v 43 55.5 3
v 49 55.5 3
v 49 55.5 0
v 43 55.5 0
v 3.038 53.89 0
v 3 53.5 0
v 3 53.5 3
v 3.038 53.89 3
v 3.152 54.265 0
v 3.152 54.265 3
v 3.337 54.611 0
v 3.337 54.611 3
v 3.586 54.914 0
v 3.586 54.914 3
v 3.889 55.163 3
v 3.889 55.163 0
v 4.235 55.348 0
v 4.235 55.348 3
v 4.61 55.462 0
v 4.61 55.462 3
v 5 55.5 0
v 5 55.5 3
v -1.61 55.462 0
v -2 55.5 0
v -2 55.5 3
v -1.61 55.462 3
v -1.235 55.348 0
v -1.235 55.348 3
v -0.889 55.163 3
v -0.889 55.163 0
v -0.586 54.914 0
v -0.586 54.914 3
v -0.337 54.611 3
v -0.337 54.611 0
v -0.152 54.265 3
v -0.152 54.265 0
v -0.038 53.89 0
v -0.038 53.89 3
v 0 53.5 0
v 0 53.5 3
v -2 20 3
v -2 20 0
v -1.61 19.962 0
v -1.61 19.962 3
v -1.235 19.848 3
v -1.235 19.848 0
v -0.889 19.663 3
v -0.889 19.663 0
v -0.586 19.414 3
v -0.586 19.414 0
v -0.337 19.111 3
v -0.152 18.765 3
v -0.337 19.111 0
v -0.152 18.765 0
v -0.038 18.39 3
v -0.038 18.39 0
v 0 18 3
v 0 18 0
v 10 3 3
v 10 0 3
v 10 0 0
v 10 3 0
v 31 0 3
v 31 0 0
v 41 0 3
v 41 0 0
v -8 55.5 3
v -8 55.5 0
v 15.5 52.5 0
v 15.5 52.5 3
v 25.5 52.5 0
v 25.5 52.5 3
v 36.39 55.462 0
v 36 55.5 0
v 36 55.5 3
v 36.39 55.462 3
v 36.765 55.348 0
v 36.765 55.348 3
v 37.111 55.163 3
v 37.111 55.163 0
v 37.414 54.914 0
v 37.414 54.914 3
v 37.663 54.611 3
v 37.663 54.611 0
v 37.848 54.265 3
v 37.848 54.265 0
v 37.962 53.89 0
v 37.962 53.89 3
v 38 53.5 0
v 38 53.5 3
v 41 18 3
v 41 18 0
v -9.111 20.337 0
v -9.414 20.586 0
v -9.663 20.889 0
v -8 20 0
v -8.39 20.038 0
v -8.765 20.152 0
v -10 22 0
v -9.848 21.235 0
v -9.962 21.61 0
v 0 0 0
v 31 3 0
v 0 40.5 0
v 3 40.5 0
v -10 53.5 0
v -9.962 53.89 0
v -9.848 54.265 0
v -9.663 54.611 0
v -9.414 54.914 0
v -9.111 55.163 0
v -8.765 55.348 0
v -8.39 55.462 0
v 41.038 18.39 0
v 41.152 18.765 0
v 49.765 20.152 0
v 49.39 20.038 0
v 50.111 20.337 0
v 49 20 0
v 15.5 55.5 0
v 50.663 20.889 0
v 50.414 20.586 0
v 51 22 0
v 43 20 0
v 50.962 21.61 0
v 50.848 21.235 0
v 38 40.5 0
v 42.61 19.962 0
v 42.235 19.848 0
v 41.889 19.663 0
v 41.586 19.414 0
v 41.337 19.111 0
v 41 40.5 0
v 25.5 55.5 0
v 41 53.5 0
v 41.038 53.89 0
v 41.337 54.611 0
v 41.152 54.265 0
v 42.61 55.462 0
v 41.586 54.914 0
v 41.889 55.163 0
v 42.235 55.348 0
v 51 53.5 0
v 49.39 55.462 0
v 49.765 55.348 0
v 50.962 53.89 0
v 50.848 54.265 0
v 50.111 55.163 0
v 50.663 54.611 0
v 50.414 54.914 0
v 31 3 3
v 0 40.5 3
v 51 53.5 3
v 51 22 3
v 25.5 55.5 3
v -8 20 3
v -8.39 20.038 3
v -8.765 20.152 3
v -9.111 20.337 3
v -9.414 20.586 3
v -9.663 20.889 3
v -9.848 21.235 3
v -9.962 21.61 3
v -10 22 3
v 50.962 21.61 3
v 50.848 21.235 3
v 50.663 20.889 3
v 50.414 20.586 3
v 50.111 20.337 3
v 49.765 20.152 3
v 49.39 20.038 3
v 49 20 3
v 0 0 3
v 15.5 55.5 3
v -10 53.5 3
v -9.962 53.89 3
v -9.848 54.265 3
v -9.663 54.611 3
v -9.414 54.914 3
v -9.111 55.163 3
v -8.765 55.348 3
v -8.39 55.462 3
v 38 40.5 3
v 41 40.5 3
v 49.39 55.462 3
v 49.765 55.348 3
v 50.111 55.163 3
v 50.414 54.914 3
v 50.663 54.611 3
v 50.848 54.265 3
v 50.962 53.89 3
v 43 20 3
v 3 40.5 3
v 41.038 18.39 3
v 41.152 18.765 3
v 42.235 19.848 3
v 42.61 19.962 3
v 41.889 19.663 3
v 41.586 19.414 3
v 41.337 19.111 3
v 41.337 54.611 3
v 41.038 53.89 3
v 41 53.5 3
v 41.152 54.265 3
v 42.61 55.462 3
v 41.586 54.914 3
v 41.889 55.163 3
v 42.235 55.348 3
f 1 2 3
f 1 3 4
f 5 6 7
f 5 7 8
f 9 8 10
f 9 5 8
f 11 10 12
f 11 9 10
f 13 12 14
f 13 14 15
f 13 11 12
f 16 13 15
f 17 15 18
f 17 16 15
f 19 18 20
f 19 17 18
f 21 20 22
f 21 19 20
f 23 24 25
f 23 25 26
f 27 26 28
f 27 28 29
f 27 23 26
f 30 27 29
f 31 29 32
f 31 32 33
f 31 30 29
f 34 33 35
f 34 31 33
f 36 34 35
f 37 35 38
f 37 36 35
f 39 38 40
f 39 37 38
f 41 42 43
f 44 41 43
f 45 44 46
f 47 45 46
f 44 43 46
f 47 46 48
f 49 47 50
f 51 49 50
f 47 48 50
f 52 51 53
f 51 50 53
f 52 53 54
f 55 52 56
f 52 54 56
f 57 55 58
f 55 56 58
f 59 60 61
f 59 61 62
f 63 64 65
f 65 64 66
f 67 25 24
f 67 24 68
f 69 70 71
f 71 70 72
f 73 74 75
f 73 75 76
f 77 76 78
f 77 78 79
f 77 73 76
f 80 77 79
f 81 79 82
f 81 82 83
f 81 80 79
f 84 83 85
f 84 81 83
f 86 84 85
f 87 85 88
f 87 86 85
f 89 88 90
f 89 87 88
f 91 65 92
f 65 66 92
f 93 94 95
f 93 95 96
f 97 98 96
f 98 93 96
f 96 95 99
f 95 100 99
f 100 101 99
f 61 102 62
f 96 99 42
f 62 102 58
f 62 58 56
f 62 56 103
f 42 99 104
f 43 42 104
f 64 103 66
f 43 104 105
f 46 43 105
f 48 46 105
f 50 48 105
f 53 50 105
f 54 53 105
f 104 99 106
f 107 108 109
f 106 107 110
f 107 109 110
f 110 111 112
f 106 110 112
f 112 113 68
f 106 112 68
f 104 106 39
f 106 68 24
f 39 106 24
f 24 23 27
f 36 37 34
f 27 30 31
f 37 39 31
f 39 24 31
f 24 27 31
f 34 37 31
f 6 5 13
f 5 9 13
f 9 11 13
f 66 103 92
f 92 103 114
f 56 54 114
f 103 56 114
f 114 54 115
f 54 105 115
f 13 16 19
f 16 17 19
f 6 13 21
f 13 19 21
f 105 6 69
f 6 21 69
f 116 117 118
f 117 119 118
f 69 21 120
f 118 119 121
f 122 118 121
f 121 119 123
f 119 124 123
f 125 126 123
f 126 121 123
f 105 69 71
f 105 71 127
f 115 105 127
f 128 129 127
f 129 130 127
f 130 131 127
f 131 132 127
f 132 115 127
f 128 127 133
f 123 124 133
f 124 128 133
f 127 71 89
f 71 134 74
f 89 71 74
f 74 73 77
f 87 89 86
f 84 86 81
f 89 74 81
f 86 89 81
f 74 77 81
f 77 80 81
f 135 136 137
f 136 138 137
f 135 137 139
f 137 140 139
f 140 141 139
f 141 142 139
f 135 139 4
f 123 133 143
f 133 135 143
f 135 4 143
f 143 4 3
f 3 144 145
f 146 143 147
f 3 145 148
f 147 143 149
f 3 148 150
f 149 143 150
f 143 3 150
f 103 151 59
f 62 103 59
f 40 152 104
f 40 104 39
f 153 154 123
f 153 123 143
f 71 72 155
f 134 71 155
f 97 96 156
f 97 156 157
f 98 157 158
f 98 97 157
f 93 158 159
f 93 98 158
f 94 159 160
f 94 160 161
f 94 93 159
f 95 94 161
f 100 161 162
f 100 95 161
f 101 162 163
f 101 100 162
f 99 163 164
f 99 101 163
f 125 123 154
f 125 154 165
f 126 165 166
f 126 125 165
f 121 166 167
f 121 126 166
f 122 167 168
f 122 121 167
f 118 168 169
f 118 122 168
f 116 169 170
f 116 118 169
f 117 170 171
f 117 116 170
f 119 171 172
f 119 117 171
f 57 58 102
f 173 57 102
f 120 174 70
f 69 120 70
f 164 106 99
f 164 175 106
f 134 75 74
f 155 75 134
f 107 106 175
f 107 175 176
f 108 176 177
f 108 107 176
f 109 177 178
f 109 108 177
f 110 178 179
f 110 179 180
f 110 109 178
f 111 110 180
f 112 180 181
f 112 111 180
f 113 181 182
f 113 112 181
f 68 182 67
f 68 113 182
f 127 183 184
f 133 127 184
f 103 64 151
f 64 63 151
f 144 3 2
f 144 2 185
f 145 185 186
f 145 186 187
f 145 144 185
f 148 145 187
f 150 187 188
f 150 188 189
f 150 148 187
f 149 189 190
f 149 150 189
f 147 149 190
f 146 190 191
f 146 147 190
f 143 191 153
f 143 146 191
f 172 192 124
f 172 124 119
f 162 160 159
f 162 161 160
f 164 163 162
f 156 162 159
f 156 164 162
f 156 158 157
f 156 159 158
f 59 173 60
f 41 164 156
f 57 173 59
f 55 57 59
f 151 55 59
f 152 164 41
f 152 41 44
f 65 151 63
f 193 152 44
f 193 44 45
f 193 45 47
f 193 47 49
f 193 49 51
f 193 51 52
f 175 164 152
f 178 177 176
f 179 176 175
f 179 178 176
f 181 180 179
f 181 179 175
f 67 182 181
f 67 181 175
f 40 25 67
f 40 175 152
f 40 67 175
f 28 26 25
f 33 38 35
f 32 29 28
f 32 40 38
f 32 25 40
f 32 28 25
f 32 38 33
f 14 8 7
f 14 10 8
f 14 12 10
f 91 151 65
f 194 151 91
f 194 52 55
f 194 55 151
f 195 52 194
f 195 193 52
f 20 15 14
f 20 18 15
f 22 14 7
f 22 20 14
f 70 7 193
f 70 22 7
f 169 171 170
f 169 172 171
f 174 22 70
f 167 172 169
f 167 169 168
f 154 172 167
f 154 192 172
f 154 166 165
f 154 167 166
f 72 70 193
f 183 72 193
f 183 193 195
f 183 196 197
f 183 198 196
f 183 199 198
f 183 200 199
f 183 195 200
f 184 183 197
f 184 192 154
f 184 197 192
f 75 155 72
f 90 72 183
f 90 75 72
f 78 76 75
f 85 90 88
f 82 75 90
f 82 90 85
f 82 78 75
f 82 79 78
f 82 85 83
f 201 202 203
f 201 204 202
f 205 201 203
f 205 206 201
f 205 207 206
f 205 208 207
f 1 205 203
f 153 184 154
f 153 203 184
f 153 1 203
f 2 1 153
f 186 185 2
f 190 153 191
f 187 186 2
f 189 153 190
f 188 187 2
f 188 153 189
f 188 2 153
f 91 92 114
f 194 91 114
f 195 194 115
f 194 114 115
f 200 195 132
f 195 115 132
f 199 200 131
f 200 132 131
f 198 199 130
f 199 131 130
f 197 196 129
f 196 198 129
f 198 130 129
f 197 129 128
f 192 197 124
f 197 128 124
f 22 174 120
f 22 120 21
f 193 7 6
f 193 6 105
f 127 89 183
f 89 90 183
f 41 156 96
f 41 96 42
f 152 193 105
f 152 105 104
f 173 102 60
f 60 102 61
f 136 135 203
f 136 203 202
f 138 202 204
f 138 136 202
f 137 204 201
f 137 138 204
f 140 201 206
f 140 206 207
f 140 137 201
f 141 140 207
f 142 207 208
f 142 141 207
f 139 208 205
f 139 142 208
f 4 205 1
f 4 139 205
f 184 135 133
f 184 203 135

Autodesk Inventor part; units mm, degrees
ref_plane "YZ Plane" through (0, 0, 0) normal (1, 0, 0) x (0, 1, 0)
ref_plane "XZ Plane" through (0, 0, 0) normal (0, 1, 0) x (-1, 0, 0)
ref_plane "XY Plane" through (0, 0, 0) normal (0, 0, 1) x (1, 0, 0)
sketch "Sketch1" plane through (0, 0, 0) normal (0, 0, 1) x (1, 0, 0)
  line L0 (0, 0) -> (41, 0)
  line L1 (41, 0) -> (41, 55.5)
  line L2 (41, 55.5) -> (0, 55.5)
  line L3 (0, 55.5) -> (0, 0)
  dimension "d0" = 41
  dimension "d1" = 55.5
extrude "Extrusion1" add sketch "Sketch1" along normal blind 3
sketch "Sketch2" plane through (0, 0, 3) normal (0, 0, 1) x (1, 0, 0)
  line L0 (0, 0) -> (41, 0) projected
  line L1 (0, 55.5) -> (0, 0) projected
  line L2 (41, 0) -> (41, 55.5) projected
  line L3 (41, 55.5) -> (0, 55.5) projected
  line L4 (0, 0) -> (10, 0)
  line L5 (10, 0) -> (10, 3)
  line L6 (10, 3) -> (0, 3)
  line L7 (0, 3) -> (0, 0)
  line L8 (41, 0) -> (31, 0)
  line L9 (31, 0) -> (31, 3)
  line L10 (31, 3) -> (41, 3)
  line L11 (41, 3) -> (41, 0)
  line L12 (15.5, 52.5) -> (25.5, 52.5)
  line L13 (25.5, 52.5) -> (25.5, 55.5)
  line L14 (25.5, 55.5) -> (15.5, 55.5)
  line L15 (15.5, 55.5) -> (15.5, 52.5)
  line L16 (15.5, 52.5) -> (25.5, 55.5) construction
  line L17 (25.5, 52.5) -> (15.5, 55.5) construction
  line L18 (15.5, 52.5) -> (25.5, 52.5) construction
  line L19 (10, 0) -> (31, 0)
  line L20 (31, 0) -> (31, 3)
  line L21 (31, 3) -> (10, 3)
  line L22 (10, 3) -> (10, 0)
  point P0 (20.5, 54)
  point P1 (20.5, 52.5)
  dimension "d35" = 10
  dimension "d36" = 3
  dimension "d37" = 10
  dimension "d38" = 3
  dimension "d39" = 10
  dimension "d40" = 0
  dimension "d41" = 3
  dimension "d44" = 41
  dimension "d45" = 20.5
sketch "Sketch3" plane through (0, 0, 3) normal (0, 0, 1) x (1, 0, 0)
  line L0 (41, 0) -> (41, 55.5) projected
  line L1 (41, 55.5) -> (38, 55.5)
  line L2 (38, 55.5) -> (38, 40.5)
  line L3 (38, 40.5) -> (41, 40.5)
  line L4 (41, 40.5) -> (41, 55.5)
  point P0 (0, 0)
  dimension "d16" = 3
  dimension "d17" = 15
extrude "Extrusion3" cut sketch "Sketch3" against normal through all
sketch "Sketch4" plane through (0, 0, 3) normal (0, 0, 1) x (1, 0, 0)
  line L0 (38, 55.5) -> (0, 55.5) projected
  line L1 (41, 0) -> (41, 40.5) projected
  line L2 (41, 20) -> (51, 20)
  line L3 (51, 20) -> (51, 55.5)
  line L4 (51, 55.5) -> (41, 55.5)
  line L5 (41, 55.5) -> (41, 20)
  line L6 (0, 0) -> (41, 0) projected
  point P0 (69, 46)
  point P1 (89, 0)
  point P2 (0, 55.5)
  dimension "d20" = 10
  dimension "d21" = 20
extrude "Extrusion4" add sketch "Sketch4" against normal blind 3
sketch "Sketch5" plane through (0, 0, 3) normal (0, 0, 1) x (1, 0, 0)
  line L0 (0, 55.5) -> (0, 0) projected
  line L1 (0, 55.5) -> (-10, 55.5)
  line L2 (-10, 55.5) -> (-10, 20)
  line L3 (-10, 20) -> (0, 20)
  line L4 (0, 20) -> (0, 55.5)
  line L5 (0, 0) -> (41, 0) projected
  point P0 (20, 0)
  dimension "d24" = 10
  dimension "d25" = 20
extrude "Extrusion5" add sketch "Sketch5" against normal blind 3
sketch "Sketch6" plane through (0, 0, 3) normal (0, 0, 1) x (1, 0, 0)
  point P0 (0, 0)
sketch "Sketch7" plane through (0, 0, 3) normal (0, 0, 1) x (1, 0, 0)
  line L0 (38, 55.5) -> (-10, 55.5) projected
  line L1 (0, 55.5) -> (3, 55.5)
  line L2 (3, 55.5) -> (3, 40.5)
  line L3 (3, 40.5) -> (0, 40.5)
  line L4 (0, 40.5) -> (0, 55.5)
  point P0 (0, 0)
  point P1 (30, 46)
  point P2 (-10, 55.5)
  dimension "d28" = 3
  dimension "d29" = 15
extrude "Extrusion6" cut sketch "Sketch7" against normal through all
fillet "Fillet1" radius 2 10 edges at (0, 55.5, 1.5) (3, 55.5, 1.5) (-10, 55.5, 1.5) (38, 55.5, 1.5) (41, 55.5, 1.5) (51, 55.5, 1.5) (51, 20, 1.5) (41, 20, 1.5) (-10, 20, 1.5) (0, 20, 1.5)
extrude "Extrusion7" cut sketch "Sketch2" against normal through all contours L5 L21 L9 L0 | L3 L13 L12 L15
equation "\"d45\" = 0.5 * d44"
properties part number "front_left_v2"
